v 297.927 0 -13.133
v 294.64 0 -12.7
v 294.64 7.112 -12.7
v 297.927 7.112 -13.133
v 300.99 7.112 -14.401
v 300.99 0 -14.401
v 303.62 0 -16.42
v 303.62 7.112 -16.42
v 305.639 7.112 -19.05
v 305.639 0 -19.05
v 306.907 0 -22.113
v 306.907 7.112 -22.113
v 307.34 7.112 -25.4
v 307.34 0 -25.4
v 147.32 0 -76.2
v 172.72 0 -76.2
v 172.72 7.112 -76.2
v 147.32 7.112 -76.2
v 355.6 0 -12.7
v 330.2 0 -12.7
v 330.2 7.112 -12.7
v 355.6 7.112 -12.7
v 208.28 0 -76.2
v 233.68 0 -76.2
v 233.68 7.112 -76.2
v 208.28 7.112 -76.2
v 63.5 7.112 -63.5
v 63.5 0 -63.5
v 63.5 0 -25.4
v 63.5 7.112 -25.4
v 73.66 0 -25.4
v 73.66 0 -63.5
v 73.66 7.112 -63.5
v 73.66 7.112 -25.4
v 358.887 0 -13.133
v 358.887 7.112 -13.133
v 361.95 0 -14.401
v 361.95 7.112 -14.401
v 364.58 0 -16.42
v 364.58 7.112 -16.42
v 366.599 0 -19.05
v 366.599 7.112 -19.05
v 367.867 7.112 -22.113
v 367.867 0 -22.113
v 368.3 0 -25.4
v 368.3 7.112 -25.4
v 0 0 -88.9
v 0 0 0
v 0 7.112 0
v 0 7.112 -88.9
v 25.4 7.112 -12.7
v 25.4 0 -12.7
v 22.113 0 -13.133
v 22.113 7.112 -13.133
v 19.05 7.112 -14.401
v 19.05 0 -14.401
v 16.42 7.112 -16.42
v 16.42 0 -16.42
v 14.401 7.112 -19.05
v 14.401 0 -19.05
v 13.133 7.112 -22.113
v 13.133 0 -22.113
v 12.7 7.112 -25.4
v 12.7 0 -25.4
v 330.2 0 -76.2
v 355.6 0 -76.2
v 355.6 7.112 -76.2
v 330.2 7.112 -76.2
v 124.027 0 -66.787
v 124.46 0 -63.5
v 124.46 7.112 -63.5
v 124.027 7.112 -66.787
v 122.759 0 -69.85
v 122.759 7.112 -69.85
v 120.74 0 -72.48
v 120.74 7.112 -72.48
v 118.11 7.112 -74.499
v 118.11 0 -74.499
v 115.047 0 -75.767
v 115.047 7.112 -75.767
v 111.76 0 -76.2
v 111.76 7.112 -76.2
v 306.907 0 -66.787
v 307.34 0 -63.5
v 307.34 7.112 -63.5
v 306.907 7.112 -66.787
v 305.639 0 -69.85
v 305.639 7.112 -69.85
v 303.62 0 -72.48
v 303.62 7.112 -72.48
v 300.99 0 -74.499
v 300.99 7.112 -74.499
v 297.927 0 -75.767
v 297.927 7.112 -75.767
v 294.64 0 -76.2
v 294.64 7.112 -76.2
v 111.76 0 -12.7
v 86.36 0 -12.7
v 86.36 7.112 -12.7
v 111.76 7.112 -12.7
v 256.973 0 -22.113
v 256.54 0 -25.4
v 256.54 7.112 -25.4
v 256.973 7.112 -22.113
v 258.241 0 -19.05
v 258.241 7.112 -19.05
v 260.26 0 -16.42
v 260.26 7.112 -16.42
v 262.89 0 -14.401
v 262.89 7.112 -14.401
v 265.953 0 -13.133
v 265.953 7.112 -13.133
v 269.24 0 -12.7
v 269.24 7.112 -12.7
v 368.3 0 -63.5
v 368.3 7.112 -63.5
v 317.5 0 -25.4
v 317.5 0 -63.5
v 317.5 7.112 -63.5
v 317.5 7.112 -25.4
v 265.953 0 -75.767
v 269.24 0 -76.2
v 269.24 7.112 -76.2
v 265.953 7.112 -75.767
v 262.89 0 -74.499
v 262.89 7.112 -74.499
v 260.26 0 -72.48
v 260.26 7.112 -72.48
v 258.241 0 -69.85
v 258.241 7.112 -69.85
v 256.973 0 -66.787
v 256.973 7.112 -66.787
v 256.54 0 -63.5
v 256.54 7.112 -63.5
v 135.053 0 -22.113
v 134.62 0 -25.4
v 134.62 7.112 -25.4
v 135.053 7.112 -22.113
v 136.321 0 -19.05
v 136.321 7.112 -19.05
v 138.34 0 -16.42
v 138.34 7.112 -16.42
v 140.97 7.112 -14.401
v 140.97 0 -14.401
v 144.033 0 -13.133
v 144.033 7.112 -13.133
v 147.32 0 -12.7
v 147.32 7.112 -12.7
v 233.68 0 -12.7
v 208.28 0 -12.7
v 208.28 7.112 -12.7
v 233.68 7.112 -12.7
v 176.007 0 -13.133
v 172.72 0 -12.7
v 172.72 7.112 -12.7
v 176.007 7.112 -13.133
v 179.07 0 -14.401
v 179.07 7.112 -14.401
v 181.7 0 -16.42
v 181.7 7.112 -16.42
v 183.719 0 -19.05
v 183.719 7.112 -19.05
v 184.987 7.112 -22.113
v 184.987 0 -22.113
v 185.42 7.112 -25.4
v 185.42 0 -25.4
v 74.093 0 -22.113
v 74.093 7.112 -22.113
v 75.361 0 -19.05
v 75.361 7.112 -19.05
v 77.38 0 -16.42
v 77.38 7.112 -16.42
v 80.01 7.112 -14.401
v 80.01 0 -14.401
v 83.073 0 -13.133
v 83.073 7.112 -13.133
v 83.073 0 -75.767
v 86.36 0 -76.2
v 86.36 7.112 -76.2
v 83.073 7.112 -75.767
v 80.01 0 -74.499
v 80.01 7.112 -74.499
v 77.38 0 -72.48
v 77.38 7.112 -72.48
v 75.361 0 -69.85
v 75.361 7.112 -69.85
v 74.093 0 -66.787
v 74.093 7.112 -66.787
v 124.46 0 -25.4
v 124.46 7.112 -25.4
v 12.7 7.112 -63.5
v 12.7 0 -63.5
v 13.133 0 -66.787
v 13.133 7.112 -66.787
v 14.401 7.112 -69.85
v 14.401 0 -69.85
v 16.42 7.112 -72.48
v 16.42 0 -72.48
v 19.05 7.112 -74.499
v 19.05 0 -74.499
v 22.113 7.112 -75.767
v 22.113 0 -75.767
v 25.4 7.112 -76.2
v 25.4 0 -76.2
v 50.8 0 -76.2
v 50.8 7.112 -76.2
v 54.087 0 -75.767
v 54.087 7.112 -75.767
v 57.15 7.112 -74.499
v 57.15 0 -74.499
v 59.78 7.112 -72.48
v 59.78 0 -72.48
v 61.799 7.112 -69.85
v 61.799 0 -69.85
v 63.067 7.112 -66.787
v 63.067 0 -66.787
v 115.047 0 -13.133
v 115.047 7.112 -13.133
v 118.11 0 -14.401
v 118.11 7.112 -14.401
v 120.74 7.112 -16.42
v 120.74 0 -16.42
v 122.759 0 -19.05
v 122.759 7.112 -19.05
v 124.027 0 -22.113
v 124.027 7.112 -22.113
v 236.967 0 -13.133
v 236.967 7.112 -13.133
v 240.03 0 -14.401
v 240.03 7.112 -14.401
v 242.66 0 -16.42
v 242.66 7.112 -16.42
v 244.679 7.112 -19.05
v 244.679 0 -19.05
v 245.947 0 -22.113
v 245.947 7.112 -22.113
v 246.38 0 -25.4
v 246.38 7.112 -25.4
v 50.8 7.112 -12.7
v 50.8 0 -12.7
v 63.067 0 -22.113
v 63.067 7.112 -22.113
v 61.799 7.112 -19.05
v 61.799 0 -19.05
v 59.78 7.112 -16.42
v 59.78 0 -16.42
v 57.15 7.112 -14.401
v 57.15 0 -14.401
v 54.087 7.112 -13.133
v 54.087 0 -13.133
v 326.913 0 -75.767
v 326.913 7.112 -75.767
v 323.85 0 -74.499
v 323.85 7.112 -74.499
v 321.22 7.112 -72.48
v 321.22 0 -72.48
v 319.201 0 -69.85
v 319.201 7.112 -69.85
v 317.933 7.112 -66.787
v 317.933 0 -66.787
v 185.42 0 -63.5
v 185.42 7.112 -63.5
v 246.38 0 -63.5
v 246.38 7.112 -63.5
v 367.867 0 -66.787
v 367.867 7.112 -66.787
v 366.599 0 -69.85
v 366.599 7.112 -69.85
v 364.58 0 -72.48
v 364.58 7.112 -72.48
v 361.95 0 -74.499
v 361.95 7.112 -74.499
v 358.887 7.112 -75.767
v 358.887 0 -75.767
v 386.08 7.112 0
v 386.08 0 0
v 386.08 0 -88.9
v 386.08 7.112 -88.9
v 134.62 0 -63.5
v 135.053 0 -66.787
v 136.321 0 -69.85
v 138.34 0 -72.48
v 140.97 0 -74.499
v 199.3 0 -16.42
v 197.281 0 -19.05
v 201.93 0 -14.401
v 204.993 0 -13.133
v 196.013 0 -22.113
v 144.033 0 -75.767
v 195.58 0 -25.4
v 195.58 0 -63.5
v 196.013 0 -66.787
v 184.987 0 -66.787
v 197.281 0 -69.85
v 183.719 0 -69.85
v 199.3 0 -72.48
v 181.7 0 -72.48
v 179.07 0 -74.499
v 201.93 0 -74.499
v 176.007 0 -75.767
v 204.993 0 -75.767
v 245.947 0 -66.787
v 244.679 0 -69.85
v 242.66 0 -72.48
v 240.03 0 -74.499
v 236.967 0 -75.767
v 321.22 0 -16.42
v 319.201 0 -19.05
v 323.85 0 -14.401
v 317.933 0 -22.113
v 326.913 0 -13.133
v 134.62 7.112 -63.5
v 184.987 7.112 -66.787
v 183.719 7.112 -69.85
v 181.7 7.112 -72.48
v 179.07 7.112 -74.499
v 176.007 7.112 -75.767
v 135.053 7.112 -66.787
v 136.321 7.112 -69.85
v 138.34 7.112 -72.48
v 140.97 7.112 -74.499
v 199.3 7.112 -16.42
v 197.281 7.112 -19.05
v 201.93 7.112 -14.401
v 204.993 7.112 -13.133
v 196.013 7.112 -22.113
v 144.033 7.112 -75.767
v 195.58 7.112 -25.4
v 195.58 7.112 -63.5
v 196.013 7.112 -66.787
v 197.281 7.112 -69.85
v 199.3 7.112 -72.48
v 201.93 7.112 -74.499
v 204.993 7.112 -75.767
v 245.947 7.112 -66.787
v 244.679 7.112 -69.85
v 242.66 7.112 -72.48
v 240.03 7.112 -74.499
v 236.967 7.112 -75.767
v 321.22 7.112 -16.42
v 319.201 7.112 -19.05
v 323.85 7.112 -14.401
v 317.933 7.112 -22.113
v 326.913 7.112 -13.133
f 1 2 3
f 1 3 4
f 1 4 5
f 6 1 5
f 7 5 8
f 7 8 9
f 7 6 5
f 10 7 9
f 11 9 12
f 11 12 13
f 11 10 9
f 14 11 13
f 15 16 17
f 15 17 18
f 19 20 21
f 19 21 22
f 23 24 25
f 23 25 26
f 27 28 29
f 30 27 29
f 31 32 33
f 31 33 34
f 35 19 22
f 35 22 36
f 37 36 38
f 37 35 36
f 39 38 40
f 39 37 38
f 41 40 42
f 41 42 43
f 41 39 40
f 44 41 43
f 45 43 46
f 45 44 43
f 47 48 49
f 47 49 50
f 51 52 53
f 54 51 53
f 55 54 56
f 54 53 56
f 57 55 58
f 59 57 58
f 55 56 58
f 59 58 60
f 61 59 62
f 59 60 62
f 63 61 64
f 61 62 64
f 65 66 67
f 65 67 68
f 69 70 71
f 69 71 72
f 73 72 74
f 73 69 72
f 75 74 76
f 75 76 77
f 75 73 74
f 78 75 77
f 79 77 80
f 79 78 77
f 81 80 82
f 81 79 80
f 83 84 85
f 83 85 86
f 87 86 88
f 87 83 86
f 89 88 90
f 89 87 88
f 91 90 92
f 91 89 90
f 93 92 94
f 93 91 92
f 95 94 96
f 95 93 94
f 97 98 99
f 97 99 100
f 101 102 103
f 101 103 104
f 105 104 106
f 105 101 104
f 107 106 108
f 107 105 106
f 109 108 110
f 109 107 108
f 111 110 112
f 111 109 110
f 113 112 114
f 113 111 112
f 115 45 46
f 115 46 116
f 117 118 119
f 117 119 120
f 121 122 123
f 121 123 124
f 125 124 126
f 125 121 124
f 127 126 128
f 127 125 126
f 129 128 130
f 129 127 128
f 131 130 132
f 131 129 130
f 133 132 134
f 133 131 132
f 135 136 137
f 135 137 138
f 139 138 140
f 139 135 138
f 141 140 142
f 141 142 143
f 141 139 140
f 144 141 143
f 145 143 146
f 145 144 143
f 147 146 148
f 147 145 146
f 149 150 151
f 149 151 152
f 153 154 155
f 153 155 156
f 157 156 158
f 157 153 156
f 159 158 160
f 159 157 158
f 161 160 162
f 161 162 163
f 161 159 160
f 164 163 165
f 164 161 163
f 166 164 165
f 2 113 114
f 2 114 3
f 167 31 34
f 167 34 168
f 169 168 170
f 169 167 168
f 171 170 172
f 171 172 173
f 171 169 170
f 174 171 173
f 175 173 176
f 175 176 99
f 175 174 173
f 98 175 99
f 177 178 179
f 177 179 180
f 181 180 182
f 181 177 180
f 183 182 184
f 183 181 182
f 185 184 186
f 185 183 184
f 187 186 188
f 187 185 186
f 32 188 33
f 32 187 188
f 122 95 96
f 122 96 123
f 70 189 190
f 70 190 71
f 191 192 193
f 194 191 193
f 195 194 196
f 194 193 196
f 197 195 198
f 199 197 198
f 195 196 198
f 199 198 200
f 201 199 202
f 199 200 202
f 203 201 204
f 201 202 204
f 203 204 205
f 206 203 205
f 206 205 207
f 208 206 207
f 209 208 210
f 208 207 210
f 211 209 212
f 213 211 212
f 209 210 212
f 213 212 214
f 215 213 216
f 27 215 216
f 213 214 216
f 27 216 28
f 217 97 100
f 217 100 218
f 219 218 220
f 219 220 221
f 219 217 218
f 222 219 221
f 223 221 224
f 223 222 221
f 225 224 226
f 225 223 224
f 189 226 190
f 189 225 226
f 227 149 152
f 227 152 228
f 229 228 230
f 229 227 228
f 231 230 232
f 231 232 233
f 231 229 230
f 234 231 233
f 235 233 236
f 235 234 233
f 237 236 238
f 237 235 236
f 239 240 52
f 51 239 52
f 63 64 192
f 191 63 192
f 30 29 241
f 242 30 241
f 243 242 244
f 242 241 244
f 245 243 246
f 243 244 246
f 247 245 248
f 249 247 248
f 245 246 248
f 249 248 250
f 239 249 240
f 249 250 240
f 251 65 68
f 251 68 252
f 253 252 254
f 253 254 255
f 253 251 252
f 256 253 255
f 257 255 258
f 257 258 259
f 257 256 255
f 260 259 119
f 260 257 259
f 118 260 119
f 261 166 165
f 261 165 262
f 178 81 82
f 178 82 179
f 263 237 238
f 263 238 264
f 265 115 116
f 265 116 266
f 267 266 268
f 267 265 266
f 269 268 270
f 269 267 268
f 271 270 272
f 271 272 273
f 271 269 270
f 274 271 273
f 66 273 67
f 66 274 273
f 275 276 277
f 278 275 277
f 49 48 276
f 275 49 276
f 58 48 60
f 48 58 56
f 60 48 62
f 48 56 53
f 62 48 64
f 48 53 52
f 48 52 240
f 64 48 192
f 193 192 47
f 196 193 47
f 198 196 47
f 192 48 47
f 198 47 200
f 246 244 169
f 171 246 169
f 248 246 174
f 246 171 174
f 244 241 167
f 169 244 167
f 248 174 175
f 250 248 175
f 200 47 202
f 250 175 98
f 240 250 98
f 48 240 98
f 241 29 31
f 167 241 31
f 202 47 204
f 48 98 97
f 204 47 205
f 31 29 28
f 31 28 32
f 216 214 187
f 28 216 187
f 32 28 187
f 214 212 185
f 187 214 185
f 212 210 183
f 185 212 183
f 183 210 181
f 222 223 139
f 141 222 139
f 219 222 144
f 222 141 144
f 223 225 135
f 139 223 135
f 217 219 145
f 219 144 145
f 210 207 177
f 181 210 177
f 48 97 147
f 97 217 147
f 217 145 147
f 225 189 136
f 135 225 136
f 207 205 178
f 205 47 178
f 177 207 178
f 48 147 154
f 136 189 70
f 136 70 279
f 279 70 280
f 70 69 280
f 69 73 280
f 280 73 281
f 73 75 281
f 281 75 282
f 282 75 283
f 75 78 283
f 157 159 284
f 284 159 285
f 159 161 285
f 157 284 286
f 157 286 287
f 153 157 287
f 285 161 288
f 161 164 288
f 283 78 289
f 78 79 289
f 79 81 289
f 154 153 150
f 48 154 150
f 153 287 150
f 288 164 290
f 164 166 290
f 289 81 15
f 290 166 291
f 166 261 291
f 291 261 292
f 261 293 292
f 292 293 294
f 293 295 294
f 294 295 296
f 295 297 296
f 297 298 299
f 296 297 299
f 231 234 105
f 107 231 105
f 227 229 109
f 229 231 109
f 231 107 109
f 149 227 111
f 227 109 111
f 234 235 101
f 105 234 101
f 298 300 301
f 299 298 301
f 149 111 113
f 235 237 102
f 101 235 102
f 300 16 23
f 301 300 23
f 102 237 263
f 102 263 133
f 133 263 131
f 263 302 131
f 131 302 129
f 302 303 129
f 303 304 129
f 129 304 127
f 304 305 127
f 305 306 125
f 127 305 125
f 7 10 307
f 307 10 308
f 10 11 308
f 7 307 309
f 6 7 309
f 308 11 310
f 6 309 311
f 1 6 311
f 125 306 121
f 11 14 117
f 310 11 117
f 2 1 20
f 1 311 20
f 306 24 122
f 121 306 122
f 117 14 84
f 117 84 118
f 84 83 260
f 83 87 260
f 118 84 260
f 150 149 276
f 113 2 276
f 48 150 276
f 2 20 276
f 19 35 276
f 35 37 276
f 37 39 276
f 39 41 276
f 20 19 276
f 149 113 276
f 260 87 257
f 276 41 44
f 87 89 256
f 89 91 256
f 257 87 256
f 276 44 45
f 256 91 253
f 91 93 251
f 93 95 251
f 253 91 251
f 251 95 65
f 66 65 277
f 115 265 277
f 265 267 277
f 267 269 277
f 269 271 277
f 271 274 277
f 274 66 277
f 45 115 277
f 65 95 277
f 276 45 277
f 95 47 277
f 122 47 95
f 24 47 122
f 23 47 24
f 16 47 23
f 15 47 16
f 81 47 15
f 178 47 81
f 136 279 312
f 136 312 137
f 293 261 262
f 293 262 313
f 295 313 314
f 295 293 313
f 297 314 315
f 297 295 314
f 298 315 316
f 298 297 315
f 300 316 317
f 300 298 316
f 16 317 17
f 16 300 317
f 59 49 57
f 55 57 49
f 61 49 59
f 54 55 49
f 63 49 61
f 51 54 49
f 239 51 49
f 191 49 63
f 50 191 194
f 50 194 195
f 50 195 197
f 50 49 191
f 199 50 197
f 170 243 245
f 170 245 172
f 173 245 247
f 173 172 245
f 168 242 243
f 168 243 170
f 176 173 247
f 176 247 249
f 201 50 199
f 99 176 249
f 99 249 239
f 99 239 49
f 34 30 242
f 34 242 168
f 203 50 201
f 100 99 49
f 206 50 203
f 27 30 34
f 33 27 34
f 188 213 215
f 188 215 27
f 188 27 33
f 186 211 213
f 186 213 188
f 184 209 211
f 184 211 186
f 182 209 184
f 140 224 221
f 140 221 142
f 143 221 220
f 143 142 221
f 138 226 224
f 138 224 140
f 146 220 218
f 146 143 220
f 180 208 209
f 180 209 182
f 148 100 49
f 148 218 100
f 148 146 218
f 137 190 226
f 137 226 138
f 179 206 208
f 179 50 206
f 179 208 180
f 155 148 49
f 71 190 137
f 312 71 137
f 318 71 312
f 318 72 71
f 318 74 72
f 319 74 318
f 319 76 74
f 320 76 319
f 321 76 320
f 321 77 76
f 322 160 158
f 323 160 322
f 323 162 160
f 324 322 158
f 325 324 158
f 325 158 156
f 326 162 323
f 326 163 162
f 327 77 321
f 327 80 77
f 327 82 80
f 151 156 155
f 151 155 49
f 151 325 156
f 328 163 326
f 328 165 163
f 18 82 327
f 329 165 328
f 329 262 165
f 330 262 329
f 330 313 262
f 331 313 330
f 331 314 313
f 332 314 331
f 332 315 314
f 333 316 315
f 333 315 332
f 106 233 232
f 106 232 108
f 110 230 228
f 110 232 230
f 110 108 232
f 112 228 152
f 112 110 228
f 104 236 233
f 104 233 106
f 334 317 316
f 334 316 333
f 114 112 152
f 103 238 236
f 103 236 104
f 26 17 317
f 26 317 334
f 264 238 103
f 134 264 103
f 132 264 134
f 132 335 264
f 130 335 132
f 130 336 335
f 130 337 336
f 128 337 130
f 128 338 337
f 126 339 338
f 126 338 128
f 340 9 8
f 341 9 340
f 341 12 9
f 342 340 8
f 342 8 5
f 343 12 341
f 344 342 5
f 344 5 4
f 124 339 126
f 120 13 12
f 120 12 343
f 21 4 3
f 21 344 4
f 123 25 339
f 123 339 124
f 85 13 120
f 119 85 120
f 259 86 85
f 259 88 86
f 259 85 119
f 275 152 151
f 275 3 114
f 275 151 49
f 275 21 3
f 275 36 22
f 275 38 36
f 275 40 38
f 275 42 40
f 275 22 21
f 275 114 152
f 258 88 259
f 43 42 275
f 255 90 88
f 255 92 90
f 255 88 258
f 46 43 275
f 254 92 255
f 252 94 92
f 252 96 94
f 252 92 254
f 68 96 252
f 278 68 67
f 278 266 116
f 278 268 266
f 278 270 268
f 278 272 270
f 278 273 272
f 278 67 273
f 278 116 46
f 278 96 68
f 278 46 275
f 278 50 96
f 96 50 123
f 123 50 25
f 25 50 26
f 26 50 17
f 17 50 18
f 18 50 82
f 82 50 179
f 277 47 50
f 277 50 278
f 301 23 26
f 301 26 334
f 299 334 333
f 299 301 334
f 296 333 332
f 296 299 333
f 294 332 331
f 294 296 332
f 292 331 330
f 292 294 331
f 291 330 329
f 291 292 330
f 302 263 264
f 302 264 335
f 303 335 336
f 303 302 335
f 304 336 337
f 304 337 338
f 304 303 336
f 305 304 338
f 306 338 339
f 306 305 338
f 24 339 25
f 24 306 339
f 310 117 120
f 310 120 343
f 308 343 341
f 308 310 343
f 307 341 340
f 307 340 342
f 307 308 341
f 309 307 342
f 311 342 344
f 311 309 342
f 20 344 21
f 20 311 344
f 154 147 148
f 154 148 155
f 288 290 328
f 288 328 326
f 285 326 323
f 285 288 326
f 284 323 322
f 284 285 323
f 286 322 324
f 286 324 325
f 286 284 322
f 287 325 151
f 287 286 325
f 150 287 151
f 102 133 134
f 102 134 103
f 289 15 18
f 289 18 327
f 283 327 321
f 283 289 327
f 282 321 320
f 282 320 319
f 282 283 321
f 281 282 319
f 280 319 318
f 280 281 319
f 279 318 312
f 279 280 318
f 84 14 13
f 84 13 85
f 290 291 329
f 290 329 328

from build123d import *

# Parameters (mm, degrees)
SKETCH1_W           = 386.08
SKETCH1_H           = 88.9
BOSS_EXTRUDE1_DEPTH = 7.112


with BuildPart() as part:
    # Sketch1 → Boss-Extrude1 (new body)
    with BuildSketch(Plane(origin=(0, 0, 0), x_dir=(1, 0, 0), z_dir=(0, 1, 0))):
        with Locations((193.04, 44.45)):
            Rectangle(SKETCH1_W, SKETCH1_H)
        with BuildLine():
            Line((73.66, 63.5), (73.66, 25.4))
            ThreePointArc((73.66, 25.4), (77.379743879, 16.419743879), (86.36, 12.7))
            Line((86.36, 12.7), (111.76, 12.7))
            ThreePointArc((111.76, 12.7), (120.740256121, 16.419743879), (124.46, 25.4))
            Line((124.46, 25.4), (124.46, 63.5))
            ThreePointArc((124.46, 63.5), (120.740256121, 72.480256121), (111.76, 76.2))
            Line((111.76, 76.2), (86.36, 76.2))
            ThreePointArc((86.36, 76.2), (77.379743879, 72.480256121), (73.66, 63.5))
        make_face(mode=Mode.SUBTRACT)
        with BuildLine():
            Line((25.4, 76.2), (50.8, 76.2))
            ThreePointArc((50.8, 76.2), (59.780256121, 72.480256121), (63.5, 63.5))
            Line((63.5, 63.5), (63.5, 25.4))
            ThreePointArc((63.5, 25.4), (59.780256121, 16.419743879), (50.8, 12.7))
            Line((50.8, 12.7), (25.4, 12.7))
            ThreePointArc((25.4, 12.7), (16.419743879, 16.419743879), (12.7, 25.4))
            Line((12.7, 25.4), (12.7, 63.5))
            ThreePointArc((12.7, 63.5), (16.419743879, 72.480256121), (25.4, 76.2))
        make_face(mode=Mode.SUBTRACT)
        with BuildLine():
            Line((134.62, 63.5), (134.62, 25.4))
            ThreePointArc((134.62, 25.4), (138.339743879, 16.419743879), (147.32, 12.7))
            Line((147.32, 12.7), (172.72, 12.7))
            ThreePointArc((172.72, 12.7), (181.700256121, 16.419743879), (185.42, 25.4))
            Line((185.42, 25.4), (185.42, 63.5))
            ThreePointArc((185.42, 63.5), (181.700256121, 72.480256121), (172.72, 76.2))
            Line((172.72, 76.2), (147.32, 76.2))
            ThreePointArc((147.32, 76.2), (138.339743879, 72.480256121), (134.62, 63.5))
        make_face(mode=Mode.SUBTRACT)
        with BuildLine():
            Line((195.58, 63.5), (195.58, 25.4))
            ThreePointArc((195.58, 25.4), (199.299743879, 16.419743879), (208.28, 12.7))
            Line((208.28, 12.7), (233.68, 12.7))
            ThreePointArc((233.68, 12.7), (242.660256121, 16.419743879), (246.38, 25.4))
            Line((246.38, 25.4), (246.38, 63.5))
            ThreePointArc((246.38, 63.5), (242.660256121, 72.480256121), (233.68, 76.2))
            Line((233.68, 76.2), (208.28, 76.2))
            ThreePointArc((208.28, 76.2), (199.299743879, 72.480256121), (195.58, 63.5))
        make_face(mode=Mode.SUBTRACT)
        with BuildLine():
            Line((256.54, 63.5), (256.54, 25.4))
            ThreePointArc((256.54, 25.4), (260.259743879, 16.419743879), (269.24, 12.7))
            Line((269.24, 12.7), (294.64, 12.7))
            ThreePointArc((294.64, 12.7), (303.620256121, 16.419743879), (307.34, 25.4))
            Line((307.34, 25.4), (307.34, 63.5))
            ThreePointArc((307.34, 63.5), (303.620256121, 72.480256121), (294.64, 76.2))
            Line((294.64, 76.2), (269.24, 76.2))
            ThreePointArc((269.24, 76.2), (260.259743879, 72.480256121), (256.54, 63.5))
        make_face(mode=Mode.SUBTRACT)
        with BuildLine():
            Line((317.5, 63.5), (317.5, 25.4))
            ThreePointArc((317.5, 25.4), (321.219743879, 16.419743879), (330.2, 12.7))
            Line((330.2, 12.7), (355.6, 12.7))
            ThreePointArc((355.6, 12.7), (364.580256121, 16.419743879), (368.3, 25.4))
            Line((368.3, 25.4), (368.3, 63.5))
            ThreePointArc((368.3, 63.5), (364.580256121, 72.480256121), (355.6, 76.2))
            Line((355.6, 76.2), (330.2, 76.2))
            ThreePointArc((330.2, 76.2), (321.219743879, 72.480256121), (317.5, 63.5))
        make_face(mode=Mode.SUBTRACT)
    extrude(amount=BOSS_EXTRUDE1_DEPTH)


solid = part.part
